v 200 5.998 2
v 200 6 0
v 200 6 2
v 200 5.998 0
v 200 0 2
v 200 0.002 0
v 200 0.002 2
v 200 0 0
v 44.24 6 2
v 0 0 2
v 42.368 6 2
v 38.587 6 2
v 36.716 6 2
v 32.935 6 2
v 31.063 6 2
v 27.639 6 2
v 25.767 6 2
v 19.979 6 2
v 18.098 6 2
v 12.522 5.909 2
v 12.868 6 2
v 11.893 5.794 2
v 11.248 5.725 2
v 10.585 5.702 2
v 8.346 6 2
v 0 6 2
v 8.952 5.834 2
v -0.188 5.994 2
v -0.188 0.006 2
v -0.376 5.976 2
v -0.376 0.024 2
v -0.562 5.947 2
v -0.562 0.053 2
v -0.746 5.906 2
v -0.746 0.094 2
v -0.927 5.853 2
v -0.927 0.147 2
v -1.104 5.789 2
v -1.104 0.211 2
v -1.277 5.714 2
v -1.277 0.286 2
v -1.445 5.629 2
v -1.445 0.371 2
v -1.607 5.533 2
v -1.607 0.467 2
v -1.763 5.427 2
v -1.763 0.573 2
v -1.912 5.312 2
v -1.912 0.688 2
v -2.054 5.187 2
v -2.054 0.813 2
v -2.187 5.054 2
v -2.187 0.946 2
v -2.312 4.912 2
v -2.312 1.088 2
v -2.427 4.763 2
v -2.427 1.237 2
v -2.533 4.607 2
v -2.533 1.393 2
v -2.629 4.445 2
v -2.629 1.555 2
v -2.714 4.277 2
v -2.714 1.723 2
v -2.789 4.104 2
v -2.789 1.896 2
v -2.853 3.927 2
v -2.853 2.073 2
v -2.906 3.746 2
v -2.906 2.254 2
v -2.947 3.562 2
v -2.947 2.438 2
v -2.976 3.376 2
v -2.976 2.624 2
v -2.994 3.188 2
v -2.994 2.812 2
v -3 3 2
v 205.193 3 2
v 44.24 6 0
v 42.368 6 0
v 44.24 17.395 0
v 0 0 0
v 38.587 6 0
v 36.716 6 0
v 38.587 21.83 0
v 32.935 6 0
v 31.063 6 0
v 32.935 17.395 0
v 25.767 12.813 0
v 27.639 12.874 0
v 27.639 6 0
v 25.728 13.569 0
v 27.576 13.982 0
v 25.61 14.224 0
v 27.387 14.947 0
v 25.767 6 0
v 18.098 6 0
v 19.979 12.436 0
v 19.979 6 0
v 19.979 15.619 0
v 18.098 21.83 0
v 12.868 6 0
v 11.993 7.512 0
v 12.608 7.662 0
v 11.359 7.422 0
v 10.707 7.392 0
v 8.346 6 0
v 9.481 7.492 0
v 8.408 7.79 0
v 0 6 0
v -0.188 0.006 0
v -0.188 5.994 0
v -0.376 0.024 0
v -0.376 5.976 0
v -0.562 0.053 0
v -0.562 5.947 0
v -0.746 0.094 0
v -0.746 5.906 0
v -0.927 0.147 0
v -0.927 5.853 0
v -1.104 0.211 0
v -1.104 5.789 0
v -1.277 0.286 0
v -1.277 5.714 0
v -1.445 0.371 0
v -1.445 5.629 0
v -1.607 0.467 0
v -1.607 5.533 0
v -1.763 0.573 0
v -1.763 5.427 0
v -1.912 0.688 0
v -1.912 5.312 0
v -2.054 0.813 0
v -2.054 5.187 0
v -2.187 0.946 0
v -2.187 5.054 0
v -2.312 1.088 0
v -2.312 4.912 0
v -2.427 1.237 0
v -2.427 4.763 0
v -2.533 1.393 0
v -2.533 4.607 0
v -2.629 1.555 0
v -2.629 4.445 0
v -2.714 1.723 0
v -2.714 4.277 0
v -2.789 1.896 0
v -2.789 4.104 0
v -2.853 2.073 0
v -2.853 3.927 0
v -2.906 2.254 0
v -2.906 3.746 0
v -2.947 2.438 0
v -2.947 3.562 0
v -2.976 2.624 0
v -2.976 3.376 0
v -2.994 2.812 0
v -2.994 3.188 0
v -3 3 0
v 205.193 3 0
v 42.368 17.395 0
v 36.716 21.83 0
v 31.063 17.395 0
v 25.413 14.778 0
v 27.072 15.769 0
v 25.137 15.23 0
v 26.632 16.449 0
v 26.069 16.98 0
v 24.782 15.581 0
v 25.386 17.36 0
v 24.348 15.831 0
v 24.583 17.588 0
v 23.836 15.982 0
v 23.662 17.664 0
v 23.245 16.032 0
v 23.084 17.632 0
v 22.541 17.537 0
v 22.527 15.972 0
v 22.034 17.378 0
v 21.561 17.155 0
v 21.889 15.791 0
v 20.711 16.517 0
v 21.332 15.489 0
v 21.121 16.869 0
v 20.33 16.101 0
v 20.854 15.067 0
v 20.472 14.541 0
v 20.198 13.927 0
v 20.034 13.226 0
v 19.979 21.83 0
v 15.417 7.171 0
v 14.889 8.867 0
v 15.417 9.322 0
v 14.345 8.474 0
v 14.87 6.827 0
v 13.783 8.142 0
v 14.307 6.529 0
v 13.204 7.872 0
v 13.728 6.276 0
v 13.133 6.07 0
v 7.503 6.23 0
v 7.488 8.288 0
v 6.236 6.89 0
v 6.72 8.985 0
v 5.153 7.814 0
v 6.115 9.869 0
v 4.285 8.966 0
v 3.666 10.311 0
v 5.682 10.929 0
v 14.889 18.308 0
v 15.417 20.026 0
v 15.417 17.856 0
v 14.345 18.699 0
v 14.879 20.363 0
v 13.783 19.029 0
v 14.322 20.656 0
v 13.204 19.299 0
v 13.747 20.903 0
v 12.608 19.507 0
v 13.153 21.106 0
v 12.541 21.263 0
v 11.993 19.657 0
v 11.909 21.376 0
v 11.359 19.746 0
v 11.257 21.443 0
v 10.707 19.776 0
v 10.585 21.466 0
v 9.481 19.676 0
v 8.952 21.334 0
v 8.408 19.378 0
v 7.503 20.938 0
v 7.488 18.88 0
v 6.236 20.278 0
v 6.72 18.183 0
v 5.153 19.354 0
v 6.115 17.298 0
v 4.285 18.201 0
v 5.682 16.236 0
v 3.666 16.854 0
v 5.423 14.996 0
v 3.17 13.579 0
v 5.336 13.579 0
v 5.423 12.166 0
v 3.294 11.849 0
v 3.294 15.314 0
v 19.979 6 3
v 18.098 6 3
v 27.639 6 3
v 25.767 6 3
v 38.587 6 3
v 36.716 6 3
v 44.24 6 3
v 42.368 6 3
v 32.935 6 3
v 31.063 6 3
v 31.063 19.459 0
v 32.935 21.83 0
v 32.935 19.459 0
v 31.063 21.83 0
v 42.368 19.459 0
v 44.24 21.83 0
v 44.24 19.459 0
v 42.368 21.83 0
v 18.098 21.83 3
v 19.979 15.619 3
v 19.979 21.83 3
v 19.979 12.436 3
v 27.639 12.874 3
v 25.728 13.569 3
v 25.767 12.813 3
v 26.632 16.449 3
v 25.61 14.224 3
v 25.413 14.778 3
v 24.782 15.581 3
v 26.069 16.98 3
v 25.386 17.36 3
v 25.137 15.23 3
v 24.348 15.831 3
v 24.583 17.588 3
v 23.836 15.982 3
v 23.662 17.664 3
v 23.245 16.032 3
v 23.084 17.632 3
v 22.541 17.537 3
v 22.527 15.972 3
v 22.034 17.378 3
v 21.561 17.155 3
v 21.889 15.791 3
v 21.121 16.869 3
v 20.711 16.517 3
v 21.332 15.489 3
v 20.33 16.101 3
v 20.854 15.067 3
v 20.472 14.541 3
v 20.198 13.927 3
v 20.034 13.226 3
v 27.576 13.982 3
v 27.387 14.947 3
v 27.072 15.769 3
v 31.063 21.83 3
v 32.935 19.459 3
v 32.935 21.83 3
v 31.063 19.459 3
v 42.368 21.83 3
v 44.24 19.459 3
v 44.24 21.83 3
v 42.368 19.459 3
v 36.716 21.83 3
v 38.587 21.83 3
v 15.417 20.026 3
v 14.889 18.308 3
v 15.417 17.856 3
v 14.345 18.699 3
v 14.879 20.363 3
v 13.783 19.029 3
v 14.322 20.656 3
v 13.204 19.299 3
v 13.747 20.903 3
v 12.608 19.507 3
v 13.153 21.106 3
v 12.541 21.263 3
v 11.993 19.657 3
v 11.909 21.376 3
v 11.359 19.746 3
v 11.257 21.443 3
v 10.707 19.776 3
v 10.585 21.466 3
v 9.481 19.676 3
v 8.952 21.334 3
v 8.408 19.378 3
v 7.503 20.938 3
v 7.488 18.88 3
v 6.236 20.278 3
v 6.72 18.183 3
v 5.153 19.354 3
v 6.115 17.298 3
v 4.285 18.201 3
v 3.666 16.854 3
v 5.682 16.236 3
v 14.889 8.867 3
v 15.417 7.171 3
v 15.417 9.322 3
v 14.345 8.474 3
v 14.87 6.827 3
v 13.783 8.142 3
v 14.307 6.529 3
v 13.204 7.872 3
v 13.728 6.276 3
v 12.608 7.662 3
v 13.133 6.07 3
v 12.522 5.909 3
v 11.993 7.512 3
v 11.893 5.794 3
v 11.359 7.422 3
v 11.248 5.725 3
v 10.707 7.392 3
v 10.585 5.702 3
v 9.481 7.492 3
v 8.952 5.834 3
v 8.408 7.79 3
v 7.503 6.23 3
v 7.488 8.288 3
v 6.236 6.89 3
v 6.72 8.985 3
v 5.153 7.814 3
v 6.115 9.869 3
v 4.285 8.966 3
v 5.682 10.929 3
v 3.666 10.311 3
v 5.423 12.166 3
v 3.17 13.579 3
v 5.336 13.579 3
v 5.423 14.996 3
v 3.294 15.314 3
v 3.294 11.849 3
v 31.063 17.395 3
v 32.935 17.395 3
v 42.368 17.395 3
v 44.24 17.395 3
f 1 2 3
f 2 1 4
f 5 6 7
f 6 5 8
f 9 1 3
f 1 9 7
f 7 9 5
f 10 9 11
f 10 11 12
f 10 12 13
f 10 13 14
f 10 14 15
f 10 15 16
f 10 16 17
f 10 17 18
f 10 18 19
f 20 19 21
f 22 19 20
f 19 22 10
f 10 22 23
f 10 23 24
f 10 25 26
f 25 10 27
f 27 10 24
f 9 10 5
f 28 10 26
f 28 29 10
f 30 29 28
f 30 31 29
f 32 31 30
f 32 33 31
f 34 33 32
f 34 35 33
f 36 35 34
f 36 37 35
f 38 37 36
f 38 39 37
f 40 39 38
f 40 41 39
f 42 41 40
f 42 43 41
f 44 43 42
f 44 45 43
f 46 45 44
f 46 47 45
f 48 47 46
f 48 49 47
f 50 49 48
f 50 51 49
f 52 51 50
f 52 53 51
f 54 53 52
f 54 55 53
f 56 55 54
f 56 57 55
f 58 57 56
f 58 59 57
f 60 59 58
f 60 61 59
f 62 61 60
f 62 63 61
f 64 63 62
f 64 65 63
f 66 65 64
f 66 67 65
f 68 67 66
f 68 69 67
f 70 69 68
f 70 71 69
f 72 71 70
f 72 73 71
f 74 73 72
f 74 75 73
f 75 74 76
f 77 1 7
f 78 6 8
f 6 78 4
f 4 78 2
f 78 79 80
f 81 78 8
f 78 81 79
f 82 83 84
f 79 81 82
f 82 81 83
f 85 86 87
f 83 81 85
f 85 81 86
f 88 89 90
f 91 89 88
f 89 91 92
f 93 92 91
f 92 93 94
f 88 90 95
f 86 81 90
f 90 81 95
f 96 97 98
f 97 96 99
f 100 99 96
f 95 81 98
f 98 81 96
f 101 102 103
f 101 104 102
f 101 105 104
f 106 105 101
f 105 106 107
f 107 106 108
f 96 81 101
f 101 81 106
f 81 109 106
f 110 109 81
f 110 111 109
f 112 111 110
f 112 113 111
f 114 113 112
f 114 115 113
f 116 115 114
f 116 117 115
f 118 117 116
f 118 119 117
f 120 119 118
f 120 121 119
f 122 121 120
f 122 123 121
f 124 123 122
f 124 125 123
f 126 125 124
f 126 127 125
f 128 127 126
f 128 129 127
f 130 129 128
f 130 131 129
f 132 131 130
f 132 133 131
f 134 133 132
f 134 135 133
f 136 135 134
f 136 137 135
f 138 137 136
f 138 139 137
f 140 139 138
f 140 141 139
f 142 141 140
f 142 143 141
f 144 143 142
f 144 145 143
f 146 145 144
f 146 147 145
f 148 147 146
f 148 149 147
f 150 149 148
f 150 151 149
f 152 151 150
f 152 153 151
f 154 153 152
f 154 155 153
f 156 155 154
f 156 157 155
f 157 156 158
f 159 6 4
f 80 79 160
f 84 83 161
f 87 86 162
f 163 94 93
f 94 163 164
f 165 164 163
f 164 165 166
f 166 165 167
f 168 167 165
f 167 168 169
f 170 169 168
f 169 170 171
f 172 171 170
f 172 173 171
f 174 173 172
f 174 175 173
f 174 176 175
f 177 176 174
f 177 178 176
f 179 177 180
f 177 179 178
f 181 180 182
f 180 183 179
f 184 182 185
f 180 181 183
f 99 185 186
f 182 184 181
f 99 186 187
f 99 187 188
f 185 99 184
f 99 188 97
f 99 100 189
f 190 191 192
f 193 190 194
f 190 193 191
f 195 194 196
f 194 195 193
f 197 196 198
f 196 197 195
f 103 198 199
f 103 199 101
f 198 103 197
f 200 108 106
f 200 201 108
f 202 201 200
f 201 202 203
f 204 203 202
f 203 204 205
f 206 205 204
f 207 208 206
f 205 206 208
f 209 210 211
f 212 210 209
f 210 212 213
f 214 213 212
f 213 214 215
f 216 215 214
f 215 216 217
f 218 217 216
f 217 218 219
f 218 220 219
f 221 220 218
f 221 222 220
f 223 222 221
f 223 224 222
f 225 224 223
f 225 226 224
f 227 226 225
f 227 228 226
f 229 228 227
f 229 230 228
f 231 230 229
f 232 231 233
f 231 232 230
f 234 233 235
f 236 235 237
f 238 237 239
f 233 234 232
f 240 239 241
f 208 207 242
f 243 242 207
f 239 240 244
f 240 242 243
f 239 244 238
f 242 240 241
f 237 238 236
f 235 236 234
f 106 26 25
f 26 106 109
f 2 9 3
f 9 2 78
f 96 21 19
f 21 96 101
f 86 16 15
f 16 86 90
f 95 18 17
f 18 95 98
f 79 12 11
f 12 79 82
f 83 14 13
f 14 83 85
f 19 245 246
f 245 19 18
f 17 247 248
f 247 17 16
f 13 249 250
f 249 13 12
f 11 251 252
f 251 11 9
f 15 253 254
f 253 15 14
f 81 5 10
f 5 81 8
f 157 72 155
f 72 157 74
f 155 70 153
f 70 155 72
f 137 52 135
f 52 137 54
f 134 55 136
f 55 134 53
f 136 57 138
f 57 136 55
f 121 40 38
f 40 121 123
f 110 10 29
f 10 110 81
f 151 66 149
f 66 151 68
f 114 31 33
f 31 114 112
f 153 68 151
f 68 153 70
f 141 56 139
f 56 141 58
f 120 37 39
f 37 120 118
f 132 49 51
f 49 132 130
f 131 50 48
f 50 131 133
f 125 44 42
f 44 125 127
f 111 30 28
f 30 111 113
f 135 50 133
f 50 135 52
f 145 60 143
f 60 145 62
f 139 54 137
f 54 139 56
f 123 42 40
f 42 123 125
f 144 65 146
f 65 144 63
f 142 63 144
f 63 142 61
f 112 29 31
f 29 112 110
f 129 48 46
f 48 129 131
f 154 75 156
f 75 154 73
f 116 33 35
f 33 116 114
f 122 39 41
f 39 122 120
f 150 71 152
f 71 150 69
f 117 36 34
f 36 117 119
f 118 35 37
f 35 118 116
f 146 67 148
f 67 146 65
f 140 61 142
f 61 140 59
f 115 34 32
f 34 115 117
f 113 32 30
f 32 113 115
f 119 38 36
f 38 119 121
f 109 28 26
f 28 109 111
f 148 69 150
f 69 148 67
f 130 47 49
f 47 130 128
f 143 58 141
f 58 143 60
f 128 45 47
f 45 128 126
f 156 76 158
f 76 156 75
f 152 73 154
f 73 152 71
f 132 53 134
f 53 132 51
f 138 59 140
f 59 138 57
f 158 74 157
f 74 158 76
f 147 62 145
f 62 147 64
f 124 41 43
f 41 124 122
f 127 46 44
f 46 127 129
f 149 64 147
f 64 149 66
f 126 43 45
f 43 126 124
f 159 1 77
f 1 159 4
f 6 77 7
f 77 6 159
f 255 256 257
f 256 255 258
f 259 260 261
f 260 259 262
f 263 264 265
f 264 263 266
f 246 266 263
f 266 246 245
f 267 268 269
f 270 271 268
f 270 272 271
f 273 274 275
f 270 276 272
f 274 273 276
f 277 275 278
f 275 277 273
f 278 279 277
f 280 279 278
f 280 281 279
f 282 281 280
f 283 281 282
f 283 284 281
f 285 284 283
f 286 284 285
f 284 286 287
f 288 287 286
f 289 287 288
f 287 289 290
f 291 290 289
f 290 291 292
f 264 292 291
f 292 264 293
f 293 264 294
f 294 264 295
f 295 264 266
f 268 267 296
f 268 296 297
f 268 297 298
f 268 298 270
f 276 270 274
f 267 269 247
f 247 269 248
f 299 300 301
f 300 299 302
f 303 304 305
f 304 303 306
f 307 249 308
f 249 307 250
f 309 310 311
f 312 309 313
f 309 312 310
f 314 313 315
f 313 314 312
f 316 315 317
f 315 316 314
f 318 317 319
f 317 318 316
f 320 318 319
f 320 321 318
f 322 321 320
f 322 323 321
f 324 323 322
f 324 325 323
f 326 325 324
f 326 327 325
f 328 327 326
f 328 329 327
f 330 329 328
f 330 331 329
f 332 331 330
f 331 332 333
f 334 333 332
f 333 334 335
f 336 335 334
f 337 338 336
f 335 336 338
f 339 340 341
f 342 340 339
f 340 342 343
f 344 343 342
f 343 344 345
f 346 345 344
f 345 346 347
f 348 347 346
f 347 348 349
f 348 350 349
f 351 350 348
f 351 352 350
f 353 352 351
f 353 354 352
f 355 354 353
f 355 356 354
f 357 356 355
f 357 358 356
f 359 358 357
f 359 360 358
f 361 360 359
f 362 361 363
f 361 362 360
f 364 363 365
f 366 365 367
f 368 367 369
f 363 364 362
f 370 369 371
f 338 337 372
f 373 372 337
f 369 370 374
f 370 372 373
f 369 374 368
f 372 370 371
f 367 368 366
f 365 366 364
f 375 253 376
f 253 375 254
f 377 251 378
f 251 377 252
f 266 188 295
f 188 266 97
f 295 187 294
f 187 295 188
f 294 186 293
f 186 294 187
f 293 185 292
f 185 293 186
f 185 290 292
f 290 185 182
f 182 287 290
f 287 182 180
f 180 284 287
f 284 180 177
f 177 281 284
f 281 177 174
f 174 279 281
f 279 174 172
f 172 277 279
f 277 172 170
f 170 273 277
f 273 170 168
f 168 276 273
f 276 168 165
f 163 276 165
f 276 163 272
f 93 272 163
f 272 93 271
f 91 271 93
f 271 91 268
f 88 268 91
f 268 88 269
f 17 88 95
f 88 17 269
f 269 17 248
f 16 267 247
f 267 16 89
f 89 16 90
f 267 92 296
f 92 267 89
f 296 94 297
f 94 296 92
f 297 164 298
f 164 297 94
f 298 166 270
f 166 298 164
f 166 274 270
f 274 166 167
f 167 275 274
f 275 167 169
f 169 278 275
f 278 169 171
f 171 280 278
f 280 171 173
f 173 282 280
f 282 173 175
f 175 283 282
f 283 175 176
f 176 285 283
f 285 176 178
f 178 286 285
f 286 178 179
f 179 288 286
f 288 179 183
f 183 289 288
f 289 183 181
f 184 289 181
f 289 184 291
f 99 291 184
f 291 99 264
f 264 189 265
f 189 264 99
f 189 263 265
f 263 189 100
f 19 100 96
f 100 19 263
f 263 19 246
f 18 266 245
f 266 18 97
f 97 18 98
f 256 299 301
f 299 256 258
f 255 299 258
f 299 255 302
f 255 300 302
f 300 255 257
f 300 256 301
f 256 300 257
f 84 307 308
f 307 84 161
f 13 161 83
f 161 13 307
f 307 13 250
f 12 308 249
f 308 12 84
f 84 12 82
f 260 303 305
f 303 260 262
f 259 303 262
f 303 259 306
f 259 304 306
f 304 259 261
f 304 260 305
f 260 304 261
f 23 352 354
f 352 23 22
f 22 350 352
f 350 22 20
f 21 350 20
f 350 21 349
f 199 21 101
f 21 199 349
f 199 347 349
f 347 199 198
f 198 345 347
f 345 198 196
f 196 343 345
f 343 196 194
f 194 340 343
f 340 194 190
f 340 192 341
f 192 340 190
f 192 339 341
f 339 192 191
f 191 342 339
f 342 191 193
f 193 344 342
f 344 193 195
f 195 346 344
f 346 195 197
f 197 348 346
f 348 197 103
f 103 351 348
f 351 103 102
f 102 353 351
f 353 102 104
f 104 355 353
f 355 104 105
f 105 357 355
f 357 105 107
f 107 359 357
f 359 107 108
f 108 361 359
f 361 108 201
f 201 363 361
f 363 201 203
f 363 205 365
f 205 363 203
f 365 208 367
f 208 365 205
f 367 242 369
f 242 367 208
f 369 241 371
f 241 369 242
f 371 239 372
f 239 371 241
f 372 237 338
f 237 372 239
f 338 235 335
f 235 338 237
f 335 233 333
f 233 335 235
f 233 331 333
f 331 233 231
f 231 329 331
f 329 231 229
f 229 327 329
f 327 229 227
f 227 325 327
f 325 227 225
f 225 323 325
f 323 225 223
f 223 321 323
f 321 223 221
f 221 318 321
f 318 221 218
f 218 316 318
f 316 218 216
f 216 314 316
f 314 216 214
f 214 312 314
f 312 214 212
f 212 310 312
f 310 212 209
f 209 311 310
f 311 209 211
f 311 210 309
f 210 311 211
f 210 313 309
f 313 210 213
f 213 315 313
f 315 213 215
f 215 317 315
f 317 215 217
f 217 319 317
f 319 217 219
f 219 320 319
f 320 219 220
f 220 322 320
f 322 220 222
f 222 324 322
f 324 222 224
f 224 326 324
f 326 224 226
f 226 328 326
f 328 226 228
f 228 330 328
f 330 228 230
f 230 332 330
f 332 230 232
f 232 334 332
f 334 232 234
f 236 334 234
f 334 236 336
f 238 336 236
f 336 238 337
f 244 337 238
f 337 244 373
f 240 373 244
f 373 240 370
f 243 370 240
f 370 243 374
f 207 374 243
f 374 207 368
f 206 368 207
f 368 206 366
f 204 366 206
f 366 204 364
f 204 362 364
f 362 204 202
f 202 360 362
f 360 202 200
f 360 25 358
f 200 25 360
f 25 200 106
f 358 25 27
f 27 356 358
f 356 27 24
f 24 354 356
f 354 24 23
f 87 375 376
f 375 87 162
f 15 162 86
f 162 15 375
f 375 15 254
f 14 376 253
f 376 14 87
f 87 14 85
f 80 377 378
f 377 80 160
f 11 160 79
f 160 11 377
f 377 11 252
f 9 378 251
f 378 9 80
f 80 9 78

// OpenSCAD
font="Montserrat:style=Black";
text="Chili";

translate([0,0,0]) {
  cube([200,6,2]);
}
translate([0,3,0]) {
    cylinder(h=2, r=3, center=false, $fn = 100);
}

translate([201.729,3,0]) {
    cylinder(2,3.464,3.464,$fn=3);
}

translate([2,6,0]){
    linear_extrude(3)
        text(text, font = font, size = 15);
}
